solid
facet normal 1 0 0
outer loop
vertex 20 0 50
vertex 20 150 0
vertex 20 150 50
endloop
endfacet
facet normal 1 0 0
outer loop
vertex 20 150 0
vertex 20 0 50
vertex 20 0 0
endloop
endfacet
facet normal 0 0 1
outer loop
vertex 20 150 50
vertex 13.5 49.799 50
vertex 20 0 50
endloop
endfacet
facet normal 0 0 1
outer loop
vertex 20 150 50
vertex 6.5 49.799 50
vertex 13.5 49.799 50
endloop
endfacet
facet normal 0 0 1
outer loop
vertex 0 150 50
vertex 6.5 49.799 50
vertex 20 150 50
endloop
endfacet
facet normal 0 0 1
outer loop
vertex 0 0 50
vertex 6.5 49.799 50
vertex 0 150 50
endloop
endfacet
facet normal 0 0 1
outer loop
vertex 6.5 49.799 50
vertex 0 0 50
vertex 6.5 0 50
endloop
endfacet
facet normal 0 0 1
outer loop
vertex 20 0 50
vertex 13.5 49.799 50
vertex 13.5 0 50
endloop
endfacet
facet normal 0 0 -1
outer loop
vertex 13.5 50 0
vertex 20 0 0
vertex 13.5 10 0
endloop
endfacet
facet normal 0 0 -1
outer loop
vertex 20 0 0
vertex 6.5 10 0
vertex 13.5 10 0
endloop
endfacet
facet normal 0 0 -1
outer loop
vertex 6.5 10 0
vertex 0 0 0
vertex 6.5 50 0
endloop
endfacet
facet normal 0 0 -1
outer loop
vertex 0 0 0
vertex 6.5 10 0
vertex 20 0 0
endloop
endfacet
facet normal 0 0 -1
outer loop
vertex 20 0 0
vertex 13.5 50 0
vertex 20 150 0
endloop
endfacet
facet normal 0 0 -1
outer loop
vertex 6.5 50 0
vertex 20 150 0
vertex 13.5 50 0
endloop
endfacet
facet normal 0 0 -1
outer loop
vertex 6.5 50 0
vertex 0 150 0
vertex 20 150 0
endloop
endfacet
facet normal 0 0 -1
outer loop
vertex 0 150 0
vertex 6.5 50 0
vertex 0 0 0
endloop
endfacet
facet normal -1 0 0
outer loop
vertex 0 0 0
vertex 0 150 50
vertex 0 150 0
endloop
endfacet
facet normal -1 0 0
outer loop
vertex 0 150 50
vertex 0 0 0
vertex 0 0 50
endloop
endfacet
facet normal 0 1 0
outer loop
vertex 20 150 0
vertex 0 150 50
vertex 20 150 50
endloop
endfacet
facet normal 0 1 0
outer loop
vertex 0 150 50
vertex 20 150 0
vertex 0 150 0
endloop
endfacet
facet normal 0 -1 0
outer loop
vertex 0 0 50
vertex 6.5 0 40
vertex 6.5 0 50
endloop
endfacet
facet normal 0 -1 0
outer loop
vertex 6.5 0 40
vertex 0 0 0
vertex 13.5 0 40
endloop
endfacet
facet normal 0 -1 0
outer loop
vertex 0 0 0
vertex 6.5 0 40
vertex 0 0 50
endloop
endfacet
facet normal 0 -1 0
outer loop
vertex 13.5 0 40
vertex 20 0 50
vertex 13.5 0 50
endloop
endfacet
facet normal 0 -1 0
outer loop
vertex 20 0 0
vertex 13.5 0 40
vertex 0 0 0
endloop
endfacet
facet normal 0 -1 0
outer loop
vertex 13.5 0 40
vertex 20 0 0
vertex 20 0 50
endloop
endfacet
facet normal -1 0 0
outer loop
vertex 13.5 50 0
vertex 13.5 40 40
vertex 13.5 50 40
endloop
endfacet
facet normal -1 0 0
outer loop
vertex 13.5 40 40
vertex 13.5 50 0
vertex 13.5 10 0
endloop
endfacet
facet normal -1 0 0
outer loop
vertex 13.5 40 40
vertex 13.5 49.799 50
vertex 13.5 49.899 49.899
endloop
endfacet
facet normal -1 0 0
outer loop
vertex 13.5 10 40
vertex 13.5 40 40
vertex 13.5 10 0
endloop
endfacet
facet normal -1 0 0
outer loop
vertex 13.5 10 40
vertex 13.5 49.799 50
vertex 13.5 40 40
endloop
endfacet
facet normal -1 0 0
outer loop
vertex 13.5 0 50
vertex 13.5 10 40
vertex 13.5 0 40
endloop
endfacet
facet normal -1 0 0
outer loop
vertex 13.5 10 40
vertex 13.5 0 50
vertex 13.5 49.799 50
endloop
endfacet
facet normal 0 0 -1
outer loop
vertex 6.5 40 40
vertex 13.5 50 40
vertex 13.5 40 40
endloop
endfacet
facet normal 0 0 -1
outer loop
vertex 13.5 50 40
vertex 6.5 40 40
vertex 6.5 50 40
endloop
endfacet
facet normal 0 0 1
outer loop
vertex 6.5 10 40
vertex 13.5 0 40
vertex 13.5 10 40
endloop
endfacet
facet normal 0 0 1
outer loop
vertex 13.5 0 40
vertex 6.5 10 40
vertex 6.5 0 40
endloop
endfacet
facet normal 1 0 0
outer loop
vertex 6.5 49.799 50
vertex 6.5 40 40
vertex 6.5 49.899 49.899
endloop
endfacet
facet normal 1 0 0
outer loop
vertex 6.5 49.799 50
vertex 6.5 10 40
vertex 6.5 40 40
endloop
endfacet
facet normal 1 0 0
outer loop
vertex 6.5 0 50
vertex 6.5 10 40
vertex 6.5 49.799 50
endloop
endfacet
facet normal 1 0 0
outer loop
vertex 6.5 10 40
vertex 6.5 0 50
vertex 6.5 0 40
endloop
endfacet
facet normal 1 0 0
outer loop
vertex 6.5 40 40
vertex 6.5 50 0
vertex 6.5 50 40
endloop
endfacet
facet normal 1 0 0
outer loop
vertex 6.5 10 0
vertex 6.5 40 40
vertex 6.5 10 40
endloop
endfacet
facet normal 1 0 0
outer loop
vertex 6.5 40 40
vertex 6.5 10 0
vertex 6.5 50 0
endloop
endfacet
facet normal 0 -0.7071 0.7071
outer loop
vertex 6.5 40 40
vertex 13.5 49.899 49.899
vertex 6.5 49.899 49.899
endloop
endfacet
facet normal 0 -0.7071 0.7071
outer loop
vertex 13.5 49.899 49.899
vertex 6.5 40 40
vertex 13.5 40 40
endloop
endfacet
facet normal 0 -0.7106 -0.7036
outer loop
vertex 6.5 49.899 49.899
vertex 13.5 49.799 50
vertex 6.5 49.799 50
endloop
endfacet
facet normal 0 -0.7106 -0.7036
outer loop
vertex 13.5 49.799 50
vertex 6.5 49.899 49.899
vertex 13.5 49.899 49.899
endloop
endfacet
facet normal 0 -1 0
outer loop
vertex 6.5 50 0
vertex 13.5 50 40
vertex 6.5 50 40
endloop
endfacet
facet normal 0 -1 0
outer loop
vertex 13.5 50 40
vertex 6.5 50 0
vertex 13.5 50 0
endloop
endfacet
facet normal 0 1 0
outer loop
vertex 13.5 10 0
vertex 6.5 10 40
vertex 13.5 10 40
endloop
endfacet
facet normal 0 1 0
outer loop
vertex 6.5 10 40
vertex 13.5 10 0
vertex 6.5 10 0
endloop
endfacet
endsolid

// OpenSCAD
difference(){
    difference(){
    difference(){
    
    cube([20,150,50]);
    
   
    translate([6.5,0,40])
         cube([7,40,10]);
     }
     
   translate([6.5,40,40])
    rotate([45,0,0])    
     cube([7,14,55]);
     }
    translate([6.5,10,0])
     cube([7,40,40]);
 }
